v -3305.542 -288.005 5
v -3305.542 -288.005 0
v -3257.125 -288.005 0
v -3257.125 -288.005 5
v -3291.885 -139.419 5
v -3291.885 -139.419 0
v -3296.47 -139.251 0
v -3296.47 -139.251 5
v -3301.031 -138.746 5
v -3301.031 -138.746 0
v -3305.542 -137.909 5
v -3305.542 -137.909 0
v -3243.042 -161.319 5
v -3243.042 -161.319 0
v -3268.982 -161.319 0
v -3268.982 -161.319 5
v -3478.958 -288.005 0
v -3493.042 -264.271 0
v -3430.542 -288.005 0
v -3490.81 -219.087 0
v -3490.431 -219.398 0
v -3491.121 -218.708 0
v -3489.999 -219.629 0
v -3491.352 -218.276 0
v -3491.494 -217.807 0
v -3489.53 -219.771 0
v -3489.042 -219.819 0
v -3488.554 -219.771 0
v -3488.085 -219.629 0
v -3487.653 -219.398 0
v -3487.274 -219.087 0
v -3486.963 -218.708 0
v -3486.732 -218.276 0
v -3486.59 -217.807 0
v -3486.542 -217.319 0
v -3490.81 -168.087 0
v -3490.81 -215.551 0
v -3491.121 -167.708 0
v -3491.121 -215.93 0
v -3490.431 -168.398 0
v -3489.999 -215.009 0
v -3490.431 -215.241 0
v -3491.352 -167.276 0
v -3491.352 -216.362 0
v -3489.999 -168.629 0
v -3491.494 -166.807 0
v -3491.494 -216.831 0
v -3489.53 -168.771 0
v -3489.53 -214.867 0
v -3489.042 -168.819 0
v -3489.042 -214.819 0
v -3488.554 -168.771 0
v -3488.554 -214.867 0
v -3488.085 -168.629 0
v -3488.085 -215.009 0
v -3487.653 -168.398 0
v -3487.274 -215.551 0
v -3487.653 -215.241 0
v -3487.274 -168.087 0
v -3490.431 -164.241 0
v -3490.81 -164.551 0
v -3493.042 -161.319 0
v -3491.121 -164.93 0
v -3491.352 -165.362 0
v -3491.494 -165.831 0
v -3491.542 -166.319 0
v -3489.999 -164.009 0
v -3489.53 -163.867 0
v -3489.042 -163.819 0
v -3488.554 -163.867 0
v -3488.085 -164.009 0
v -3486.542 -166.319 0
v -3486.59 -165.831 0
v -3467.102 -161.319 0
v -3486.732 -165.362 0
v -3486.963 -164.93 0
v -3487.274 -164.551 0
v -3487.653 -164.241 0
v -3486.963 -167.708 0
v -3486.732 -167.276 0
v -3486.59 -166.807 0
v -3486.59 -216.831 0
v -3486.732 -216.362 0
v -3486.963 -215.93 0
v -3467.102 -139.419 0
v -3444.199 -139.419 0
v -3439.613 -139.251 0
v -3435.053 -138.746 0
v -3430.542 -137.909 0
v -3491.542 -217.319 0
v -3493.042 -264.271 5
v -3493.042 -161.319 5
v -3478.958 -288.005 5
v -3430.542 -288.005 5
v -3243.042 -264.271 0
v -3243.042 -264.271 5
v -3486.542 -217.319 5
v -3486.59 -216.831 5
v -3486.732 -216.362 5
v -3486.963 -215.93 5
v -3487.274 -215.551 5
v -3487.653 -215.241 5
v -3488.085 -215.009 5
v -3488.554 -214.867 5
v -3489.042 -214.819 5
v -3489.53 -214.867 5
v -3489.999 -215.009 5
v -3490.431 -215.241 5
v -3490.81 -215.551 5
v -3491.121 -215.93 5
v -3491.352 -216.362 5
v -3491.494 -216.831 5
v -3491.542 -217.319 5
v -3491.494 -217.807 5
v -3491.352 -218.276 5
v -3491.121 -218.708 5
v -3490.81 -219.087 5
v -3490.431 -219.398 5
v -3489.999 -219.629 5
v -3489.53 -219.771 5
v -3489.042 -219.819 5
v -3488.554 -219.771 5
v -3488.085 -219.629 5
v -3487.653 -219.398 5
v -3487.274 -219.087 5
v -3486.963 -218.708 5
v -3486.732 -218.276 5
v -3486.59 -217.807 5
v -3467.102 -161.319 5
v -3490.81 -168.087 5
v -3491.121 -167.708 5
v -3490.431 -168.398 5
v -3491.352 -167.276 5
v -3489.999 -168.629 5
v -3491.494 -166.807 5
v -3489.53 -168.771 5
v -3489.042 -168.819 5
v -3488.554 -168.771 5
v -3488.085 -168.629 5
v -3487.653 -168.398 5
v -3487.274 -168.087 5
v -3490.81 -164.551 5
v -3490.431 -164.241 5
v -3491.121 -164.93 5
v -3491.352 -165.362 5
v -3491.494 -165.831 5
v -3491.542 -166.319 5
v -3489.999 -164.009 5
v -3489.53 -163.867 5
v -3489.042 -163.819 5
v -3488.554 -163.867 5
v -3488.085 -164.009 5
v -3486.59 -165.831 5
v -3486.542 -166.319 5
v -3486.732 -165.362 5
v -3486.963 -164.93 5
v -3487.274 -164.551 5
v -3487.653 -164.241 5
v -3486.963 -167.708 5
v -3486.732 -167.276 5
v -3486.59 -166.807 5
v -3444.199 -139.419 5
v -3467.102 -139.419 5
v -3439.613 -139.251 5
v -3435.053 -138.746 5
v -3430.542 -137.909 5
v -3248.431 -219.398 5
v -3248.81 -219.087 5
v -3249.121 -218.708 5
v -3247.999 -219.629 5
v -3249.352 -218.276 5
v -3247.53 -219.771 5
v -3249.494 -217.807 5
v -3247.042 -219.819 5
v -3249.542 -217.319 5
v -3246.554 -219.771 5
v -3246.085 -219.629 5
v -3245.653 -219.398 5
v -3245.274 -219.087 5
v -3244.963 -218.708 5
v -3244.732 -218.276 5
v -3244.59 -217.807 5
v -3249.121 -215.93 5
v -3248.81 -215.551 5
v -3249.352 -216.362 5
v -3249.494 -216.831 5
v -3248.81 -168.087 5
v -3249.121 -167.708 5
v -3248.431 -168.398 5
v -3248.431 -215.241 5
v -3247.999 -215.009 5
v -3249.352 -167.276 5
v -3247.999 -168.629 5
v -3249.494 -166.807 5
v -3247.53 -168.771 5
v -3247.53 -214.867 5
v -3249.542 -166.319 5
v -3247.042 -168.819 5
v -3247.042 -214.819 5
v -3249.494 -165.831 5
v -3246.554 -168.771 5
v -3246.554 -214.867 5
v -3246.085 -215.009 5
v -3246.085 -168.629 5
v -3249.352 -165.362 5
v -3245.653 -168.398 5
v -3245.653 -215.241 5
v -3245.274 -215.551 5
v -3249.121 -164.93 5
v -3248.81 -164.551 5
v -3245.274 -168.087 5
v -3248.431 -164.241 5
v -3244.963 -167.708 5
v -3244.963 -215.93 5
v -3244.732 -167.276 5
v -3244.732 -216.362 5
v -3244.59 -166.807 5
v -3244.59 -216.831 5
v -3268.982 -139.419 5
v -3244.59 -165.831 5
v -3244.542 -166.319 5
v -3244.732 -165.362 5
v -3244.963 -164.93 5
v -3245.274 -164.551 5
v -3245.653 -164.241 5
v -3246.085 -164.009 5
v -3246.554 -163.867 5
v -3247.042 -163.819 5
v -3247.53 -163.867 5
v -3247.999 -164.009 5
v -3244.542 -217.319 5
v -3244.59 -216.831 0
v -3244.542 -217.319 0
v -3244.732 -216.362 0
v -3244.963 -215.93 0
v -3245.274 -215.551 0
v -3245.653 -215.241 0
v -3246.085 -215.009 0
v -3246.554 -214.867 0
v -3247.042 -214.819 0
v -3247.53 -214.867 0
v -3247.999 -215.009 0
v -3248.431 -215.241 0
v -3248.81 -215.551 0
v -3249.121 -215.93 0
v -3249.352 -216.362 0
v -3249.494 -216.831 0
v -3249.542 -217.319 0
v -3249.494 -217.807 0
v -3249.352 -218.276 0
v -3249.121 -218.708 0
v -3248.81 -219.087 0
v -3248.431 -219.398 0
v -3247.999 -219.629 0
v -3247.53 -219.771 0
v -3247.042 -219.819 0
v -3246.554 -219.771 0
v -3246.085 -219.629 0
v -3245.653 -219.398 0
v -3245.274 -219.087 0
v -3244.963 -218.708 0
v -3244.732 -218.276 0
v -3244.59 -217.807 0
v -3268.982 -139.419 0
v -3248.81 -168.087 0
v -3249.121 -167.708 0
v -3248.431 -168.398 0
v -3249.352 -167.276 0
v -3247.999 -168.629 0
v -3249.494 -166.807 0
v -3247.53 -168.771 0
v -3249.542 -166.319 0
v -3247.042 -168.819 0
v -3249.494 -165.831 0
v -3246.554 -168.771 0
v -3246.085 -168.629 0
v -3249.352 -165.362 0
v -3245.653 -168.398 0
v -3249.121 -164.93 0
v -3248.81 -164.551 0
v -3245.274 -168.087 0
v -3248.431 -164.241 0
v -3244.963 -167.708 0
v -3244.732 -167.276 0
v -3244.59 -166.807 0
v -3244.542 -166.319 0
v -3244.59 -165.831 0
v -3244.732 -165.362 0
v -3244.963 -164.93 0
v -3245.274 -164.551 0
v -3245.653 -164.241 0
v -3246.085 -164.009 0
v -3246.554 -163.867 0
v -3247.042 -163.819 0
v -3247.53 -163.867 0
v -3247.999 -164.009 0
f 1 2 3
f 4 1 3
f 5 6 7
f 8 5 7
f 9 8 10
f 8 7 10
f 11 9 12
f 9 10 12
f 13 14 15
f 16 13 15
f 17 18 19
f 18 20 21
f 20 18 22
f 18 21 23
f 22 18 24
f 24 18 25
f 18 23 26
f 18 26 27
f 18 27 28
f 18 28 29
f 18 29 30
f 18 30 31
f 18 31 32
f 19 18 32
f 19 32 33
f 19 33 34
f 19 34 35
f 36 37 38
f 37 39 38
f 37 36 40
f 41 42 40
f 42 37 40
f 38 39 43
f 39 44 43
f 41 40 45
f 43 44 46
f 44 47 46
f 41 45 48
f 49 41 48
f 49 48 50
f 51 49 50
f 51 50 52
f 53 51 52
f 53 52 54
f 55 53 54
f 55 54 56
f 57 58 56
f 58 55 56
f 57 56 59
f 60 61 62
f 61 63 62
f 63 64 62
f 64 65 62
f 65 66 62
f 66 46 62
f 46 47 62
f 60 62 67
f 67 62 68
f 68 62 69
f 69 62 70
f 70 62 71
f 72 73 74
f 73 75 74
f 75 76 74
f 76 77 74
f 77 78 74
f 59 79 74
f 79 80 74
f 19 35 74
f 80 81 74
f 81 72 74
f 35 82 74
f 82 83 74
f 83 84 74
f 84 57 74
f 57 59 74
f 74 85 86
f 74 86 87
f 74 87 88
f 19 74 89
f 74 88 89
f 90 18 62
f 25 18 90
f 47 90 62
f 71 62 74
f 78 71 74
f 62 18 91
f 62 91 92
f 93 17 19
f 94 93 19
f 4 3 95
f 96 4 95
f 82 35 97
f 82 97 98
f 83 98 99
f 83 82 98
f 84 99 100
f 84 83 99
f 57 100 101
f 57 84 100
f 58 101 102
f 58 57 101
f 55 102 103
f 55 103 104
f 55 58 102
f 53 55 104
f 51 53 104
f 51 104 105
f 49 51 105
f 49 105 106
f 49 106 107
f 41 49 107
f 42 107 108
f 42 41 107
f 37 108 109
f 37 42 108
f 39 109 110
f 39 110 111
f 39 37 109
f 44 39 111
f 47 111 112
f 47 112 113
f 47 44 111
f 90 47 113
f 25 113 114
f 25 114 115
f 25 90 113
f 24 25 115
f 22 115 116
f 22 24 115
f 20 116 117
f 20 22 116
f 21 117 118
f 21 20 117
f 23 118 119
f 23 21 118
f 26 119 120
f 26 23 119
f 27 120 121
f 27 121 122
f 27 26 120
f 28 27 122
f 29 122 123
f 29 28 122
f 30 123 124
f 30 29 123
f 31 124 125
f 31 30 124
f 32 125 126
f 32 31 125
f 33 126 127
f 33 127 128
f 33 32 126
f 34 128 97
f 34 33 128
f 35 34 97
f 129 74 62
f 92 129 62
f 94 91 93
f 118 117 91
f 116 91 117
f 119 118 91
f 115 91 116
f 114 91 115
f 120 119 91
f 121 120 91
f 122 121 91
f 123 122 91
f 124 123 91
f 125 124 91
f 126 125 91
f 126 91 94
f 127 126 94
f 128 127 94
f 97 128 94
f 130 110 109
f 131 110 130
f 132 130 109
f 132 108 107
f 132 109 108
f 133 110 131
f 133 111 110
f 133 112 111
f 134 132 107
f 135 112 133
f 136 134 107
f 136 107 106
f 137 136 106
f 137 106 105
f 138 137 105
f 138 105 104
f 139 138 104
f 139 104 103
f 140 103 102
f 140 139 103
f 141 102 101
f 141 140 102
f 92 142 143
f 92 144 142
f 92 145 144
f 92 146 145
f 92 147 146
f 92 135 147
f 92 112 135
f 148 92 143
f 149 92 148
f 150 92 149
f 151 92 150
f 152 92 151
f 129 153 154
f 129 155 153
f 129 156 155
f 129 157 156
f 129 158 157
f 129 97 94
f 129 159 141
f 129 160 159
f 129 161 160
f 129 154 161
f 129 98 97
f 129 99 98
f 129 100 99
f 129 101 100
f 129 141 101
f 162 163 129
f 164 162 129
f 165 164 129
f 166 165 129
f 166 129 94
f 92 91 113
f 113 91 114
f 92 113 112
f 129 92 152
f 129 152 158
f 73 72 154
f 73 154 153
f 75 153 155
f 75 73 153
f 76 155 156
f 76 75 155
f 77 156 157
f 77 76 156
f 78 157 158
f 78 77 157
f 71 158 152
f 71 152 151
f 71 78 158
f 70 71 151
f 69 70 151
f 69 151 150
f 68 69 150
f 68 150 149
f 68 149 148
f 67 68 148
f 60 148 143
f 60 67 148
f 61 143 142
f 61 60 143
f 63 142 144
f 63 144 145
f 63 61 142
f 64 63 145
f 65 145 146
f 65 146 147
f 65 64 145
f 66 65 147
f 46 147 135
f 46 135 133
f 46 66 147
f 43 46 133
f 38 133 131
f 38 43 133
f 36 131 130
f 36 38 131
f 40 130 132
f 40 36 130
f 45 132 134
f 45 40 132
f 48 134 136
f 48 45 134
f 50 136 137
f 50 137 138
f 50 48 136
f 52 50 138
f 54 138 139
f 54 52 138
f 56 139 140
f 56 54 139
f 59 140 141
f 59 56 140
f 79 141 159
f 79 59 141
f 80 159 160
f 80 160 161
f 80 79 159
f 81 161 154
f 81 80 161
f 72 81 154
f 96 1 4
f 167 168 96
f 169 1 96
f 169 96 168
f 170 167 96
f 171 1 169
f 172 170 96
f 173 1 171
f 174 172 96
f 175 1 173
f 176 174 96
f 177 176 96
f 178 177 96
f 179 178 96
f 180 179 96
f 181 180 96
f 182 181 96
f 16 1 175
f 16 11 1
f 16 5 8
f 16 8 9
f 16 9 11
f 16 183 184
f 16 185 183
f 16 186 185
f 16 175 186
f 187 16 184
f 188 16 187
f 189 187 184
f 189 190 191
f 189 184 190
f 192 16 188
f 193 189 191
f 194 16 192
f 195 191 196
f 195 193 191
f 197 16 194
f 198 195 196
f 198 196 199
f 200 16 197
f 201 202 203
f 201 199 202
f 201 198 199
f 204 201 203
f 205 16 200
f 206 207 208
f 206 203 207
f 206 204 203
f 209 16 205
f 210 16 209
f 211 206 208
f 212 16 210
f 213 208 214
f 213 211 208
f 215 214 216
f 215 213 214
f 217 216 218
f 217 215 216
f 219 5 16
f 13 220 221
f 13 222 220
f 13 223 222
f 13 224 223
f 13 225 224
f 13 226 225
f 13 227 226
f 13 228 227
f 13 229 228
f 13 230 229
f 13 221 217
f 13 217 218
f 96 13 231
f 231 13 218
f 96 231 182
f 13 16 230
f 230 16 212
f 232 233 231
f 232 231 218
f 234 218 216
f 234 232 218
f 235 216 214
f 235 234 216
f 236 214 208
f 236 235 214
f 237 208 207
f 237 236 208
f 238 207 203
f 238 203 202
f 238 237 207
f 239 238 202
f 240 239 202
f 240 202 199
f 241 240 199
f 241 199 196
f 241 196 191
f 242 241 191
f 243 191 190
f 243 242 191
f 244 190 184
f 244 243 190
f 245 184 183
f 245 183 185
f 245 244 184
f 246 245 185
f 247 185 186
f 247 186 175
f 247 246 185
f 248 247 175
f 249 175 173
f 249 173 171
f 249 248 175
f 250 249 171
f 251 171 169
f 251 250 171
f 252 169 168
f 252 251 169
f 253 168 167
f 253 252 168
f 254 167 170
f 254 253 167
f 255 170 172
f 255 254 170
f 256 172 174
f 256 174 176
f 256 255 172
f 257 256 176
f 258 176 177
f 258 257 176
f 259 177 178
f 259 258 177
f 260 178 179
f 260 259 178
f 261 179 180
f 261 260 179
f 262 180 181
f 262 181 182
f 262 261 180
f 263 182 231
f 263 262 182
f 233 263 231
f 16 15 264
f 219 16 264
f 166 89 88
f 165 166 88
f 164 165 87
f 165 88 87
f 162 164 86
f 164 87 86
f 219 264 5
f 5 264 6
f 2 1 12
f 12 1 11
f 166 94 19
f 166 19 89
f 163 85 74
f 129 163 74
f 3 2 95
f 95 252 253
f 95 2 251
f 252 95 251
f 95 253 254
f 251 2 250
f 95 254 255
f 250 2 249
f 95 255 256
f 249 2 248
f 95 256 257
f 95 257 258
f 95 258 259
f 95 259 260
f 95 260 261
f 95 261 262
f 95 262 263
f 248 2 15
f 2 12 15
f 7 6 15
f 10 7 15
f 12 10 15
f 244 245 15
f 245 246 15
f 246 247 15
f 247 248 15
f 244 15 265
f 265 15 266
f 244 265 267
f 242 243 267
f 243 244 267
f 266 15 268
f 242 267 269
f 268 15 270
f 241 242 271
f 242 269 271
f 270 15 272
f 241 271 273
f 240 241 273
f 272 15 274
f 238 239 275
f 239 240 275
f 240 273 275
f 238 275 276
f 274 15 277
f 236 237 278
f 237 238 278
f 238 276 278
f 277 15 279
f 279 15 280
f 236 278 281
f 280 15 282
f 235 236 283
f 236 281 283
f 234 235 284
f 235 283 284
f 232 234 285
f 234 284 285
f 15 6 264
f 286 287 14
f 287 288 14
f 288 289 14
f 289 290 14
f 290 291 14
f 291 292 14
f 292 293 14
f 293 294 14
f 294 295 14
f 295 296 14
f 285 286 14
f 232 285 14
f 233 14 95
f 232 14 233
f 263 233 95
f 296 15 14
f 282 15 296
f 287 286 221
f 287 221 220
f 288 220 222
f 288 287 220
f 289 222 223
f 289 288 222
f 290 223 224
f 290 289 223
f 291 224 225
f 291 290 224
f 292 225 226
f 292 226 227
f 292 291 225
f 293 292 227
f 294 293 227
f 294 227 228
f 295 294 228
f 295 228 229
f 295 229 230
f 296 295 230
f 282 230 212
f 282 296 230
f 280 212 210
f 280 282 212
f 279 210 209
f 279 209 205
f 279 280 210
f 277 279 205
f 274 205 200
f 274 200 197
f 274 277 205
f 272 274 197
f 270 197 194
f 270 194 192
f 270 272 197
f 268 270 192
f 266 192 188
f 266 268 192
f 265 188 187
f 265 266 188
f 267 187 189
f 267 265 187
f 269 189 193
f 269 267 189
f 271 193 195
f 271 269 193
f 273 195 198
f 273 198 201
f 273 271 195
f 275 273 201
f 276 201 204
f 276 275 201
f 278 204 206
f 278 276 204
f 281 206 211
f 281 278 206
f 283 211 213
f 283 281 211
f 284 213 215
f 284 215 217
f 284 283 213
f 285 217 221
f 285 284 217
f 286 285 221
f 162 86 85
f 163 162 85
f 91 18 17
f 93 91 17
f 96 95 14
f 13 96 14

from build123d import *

# Parameters (mm, degrees)
SKETCH1_W           = 250
SKETCH1_H           = 221.085663757
SKETCH1_R           = 2.5
BOSS_EXTRUDE1_DEPTH = 5
SKETCH6_R           = 62.5
CUT_EXTRUDE4_DEPTH  = 6
SKETCH7_W           = 125
SKETCH7_H           = 298.698107089
CUT_EXTRUDE5_DEPTH  = 5


with BuildPart() as part:
    # Sketch1 → Boss-Extrude1 (new body)
    with BuildSketch(Plane.XY):
        with Locations((-3368.041949546, -177.462013972)):
            Rectangle(SKETCH1_W, SKETCH1_H)
        with Locations((-3489.041949546, -217.319182093)):
            Circle(SKETCH1_R, mode=Mode.SUBTRACT)
        with Locations((-3489.041949546, -166.319182093)):
            Circle(SKETCH1_R, mode=Mode.SUBTRACT)
        with Locations((-3247.041949546, -166.319182093)):
            Circle(SKETCH1_R, mode=Mode.SUBTRACT)
        with Locations((-3247.041949546, -217.319182093)):
            Circle(SKETCH1_R, mode=Mode.SUBTRACT)
    extrude(amount=BOSS_EXTRUDE1_DEPTH)

    # Sketch6 → Cut-Extrude4 (cut, through all)
    with BuildSketch(Plane.XY):
        with Locations((-3368.041949546, -300.417289182)):
            Circle(SKETCH6_R)
        Polygon((-3503.457885375, -270.451546314), (-3493.041949546, -264.270843991), (-3478.958452604, -288.00484585), (-3489.374388434, -294.185548172), align=None)
        with BuildLine():
            Line((-3493.041949546, -161.319182093), (-3493.041949546, -66.919182093))
            Line((-3493.041949546, -66.919182093), (-3382.503777097, -66.919182093))
            ThreePointArc((-3382.503777097, -66.919182093), (-3396.600008581, -117.423811459), (-3444.198590493, -139.419182093))
            Line((-3444.198590493, -139.419182093), (-3467.101949546, -139.419182093))
            Line((-3467.101949546, -139.419182093), (-3467.101949546, -161.319182093))
            Line((-3467.101949546, -161.319182093), (-3493.041949546, -161.319182093))
        make_face()
        Polygon((-3246.709510658, -294.185548172), (-3257.125446487, -288.00484585), (-3243.041949546, -264.270843991), (-3232.626013716, -270.451546314), align=None)
        with BuildLine():
            Line((-3268.981949546, -139.419182093), (-3291.885308598, -139.419182093))
            ThreePointArc((-3291.885308598, -139.419182093), (-3339.48389051, -117.423811459), (-3353.580121995, -66.919182093))
            Line((-3353.580121995, -66.919182093), (-3243.041949546, -66.919182093))
            Line((-3243.041949546, -66.919182093), (-3243.041949546, -161.319182093))
            Line((-3243.041949546, -161.319182093), (-3268.981949546, -161.319182093))
            Line((-3268.981949546, -161.319182093), (-3268.981949546, -139.419182093))
        make_face()
    extrude(amount=CUT_EXTRUDE4_DEPTH, mode=Mode.SUBTRACT)

    # Sketch7 → Cut-Extrude5 (cut)
    with BuildSketch(Plane.XY.offset(5)):
        with Locations((-3368.041949546, -216.268235638)):
            Rectangle(SKETCH7_W, SKETCH7_H)
    extrude(amount=-CUT_EXTRUDE5_DEPTH, mode=Mode.SUBTRACT)


solid = part.part
